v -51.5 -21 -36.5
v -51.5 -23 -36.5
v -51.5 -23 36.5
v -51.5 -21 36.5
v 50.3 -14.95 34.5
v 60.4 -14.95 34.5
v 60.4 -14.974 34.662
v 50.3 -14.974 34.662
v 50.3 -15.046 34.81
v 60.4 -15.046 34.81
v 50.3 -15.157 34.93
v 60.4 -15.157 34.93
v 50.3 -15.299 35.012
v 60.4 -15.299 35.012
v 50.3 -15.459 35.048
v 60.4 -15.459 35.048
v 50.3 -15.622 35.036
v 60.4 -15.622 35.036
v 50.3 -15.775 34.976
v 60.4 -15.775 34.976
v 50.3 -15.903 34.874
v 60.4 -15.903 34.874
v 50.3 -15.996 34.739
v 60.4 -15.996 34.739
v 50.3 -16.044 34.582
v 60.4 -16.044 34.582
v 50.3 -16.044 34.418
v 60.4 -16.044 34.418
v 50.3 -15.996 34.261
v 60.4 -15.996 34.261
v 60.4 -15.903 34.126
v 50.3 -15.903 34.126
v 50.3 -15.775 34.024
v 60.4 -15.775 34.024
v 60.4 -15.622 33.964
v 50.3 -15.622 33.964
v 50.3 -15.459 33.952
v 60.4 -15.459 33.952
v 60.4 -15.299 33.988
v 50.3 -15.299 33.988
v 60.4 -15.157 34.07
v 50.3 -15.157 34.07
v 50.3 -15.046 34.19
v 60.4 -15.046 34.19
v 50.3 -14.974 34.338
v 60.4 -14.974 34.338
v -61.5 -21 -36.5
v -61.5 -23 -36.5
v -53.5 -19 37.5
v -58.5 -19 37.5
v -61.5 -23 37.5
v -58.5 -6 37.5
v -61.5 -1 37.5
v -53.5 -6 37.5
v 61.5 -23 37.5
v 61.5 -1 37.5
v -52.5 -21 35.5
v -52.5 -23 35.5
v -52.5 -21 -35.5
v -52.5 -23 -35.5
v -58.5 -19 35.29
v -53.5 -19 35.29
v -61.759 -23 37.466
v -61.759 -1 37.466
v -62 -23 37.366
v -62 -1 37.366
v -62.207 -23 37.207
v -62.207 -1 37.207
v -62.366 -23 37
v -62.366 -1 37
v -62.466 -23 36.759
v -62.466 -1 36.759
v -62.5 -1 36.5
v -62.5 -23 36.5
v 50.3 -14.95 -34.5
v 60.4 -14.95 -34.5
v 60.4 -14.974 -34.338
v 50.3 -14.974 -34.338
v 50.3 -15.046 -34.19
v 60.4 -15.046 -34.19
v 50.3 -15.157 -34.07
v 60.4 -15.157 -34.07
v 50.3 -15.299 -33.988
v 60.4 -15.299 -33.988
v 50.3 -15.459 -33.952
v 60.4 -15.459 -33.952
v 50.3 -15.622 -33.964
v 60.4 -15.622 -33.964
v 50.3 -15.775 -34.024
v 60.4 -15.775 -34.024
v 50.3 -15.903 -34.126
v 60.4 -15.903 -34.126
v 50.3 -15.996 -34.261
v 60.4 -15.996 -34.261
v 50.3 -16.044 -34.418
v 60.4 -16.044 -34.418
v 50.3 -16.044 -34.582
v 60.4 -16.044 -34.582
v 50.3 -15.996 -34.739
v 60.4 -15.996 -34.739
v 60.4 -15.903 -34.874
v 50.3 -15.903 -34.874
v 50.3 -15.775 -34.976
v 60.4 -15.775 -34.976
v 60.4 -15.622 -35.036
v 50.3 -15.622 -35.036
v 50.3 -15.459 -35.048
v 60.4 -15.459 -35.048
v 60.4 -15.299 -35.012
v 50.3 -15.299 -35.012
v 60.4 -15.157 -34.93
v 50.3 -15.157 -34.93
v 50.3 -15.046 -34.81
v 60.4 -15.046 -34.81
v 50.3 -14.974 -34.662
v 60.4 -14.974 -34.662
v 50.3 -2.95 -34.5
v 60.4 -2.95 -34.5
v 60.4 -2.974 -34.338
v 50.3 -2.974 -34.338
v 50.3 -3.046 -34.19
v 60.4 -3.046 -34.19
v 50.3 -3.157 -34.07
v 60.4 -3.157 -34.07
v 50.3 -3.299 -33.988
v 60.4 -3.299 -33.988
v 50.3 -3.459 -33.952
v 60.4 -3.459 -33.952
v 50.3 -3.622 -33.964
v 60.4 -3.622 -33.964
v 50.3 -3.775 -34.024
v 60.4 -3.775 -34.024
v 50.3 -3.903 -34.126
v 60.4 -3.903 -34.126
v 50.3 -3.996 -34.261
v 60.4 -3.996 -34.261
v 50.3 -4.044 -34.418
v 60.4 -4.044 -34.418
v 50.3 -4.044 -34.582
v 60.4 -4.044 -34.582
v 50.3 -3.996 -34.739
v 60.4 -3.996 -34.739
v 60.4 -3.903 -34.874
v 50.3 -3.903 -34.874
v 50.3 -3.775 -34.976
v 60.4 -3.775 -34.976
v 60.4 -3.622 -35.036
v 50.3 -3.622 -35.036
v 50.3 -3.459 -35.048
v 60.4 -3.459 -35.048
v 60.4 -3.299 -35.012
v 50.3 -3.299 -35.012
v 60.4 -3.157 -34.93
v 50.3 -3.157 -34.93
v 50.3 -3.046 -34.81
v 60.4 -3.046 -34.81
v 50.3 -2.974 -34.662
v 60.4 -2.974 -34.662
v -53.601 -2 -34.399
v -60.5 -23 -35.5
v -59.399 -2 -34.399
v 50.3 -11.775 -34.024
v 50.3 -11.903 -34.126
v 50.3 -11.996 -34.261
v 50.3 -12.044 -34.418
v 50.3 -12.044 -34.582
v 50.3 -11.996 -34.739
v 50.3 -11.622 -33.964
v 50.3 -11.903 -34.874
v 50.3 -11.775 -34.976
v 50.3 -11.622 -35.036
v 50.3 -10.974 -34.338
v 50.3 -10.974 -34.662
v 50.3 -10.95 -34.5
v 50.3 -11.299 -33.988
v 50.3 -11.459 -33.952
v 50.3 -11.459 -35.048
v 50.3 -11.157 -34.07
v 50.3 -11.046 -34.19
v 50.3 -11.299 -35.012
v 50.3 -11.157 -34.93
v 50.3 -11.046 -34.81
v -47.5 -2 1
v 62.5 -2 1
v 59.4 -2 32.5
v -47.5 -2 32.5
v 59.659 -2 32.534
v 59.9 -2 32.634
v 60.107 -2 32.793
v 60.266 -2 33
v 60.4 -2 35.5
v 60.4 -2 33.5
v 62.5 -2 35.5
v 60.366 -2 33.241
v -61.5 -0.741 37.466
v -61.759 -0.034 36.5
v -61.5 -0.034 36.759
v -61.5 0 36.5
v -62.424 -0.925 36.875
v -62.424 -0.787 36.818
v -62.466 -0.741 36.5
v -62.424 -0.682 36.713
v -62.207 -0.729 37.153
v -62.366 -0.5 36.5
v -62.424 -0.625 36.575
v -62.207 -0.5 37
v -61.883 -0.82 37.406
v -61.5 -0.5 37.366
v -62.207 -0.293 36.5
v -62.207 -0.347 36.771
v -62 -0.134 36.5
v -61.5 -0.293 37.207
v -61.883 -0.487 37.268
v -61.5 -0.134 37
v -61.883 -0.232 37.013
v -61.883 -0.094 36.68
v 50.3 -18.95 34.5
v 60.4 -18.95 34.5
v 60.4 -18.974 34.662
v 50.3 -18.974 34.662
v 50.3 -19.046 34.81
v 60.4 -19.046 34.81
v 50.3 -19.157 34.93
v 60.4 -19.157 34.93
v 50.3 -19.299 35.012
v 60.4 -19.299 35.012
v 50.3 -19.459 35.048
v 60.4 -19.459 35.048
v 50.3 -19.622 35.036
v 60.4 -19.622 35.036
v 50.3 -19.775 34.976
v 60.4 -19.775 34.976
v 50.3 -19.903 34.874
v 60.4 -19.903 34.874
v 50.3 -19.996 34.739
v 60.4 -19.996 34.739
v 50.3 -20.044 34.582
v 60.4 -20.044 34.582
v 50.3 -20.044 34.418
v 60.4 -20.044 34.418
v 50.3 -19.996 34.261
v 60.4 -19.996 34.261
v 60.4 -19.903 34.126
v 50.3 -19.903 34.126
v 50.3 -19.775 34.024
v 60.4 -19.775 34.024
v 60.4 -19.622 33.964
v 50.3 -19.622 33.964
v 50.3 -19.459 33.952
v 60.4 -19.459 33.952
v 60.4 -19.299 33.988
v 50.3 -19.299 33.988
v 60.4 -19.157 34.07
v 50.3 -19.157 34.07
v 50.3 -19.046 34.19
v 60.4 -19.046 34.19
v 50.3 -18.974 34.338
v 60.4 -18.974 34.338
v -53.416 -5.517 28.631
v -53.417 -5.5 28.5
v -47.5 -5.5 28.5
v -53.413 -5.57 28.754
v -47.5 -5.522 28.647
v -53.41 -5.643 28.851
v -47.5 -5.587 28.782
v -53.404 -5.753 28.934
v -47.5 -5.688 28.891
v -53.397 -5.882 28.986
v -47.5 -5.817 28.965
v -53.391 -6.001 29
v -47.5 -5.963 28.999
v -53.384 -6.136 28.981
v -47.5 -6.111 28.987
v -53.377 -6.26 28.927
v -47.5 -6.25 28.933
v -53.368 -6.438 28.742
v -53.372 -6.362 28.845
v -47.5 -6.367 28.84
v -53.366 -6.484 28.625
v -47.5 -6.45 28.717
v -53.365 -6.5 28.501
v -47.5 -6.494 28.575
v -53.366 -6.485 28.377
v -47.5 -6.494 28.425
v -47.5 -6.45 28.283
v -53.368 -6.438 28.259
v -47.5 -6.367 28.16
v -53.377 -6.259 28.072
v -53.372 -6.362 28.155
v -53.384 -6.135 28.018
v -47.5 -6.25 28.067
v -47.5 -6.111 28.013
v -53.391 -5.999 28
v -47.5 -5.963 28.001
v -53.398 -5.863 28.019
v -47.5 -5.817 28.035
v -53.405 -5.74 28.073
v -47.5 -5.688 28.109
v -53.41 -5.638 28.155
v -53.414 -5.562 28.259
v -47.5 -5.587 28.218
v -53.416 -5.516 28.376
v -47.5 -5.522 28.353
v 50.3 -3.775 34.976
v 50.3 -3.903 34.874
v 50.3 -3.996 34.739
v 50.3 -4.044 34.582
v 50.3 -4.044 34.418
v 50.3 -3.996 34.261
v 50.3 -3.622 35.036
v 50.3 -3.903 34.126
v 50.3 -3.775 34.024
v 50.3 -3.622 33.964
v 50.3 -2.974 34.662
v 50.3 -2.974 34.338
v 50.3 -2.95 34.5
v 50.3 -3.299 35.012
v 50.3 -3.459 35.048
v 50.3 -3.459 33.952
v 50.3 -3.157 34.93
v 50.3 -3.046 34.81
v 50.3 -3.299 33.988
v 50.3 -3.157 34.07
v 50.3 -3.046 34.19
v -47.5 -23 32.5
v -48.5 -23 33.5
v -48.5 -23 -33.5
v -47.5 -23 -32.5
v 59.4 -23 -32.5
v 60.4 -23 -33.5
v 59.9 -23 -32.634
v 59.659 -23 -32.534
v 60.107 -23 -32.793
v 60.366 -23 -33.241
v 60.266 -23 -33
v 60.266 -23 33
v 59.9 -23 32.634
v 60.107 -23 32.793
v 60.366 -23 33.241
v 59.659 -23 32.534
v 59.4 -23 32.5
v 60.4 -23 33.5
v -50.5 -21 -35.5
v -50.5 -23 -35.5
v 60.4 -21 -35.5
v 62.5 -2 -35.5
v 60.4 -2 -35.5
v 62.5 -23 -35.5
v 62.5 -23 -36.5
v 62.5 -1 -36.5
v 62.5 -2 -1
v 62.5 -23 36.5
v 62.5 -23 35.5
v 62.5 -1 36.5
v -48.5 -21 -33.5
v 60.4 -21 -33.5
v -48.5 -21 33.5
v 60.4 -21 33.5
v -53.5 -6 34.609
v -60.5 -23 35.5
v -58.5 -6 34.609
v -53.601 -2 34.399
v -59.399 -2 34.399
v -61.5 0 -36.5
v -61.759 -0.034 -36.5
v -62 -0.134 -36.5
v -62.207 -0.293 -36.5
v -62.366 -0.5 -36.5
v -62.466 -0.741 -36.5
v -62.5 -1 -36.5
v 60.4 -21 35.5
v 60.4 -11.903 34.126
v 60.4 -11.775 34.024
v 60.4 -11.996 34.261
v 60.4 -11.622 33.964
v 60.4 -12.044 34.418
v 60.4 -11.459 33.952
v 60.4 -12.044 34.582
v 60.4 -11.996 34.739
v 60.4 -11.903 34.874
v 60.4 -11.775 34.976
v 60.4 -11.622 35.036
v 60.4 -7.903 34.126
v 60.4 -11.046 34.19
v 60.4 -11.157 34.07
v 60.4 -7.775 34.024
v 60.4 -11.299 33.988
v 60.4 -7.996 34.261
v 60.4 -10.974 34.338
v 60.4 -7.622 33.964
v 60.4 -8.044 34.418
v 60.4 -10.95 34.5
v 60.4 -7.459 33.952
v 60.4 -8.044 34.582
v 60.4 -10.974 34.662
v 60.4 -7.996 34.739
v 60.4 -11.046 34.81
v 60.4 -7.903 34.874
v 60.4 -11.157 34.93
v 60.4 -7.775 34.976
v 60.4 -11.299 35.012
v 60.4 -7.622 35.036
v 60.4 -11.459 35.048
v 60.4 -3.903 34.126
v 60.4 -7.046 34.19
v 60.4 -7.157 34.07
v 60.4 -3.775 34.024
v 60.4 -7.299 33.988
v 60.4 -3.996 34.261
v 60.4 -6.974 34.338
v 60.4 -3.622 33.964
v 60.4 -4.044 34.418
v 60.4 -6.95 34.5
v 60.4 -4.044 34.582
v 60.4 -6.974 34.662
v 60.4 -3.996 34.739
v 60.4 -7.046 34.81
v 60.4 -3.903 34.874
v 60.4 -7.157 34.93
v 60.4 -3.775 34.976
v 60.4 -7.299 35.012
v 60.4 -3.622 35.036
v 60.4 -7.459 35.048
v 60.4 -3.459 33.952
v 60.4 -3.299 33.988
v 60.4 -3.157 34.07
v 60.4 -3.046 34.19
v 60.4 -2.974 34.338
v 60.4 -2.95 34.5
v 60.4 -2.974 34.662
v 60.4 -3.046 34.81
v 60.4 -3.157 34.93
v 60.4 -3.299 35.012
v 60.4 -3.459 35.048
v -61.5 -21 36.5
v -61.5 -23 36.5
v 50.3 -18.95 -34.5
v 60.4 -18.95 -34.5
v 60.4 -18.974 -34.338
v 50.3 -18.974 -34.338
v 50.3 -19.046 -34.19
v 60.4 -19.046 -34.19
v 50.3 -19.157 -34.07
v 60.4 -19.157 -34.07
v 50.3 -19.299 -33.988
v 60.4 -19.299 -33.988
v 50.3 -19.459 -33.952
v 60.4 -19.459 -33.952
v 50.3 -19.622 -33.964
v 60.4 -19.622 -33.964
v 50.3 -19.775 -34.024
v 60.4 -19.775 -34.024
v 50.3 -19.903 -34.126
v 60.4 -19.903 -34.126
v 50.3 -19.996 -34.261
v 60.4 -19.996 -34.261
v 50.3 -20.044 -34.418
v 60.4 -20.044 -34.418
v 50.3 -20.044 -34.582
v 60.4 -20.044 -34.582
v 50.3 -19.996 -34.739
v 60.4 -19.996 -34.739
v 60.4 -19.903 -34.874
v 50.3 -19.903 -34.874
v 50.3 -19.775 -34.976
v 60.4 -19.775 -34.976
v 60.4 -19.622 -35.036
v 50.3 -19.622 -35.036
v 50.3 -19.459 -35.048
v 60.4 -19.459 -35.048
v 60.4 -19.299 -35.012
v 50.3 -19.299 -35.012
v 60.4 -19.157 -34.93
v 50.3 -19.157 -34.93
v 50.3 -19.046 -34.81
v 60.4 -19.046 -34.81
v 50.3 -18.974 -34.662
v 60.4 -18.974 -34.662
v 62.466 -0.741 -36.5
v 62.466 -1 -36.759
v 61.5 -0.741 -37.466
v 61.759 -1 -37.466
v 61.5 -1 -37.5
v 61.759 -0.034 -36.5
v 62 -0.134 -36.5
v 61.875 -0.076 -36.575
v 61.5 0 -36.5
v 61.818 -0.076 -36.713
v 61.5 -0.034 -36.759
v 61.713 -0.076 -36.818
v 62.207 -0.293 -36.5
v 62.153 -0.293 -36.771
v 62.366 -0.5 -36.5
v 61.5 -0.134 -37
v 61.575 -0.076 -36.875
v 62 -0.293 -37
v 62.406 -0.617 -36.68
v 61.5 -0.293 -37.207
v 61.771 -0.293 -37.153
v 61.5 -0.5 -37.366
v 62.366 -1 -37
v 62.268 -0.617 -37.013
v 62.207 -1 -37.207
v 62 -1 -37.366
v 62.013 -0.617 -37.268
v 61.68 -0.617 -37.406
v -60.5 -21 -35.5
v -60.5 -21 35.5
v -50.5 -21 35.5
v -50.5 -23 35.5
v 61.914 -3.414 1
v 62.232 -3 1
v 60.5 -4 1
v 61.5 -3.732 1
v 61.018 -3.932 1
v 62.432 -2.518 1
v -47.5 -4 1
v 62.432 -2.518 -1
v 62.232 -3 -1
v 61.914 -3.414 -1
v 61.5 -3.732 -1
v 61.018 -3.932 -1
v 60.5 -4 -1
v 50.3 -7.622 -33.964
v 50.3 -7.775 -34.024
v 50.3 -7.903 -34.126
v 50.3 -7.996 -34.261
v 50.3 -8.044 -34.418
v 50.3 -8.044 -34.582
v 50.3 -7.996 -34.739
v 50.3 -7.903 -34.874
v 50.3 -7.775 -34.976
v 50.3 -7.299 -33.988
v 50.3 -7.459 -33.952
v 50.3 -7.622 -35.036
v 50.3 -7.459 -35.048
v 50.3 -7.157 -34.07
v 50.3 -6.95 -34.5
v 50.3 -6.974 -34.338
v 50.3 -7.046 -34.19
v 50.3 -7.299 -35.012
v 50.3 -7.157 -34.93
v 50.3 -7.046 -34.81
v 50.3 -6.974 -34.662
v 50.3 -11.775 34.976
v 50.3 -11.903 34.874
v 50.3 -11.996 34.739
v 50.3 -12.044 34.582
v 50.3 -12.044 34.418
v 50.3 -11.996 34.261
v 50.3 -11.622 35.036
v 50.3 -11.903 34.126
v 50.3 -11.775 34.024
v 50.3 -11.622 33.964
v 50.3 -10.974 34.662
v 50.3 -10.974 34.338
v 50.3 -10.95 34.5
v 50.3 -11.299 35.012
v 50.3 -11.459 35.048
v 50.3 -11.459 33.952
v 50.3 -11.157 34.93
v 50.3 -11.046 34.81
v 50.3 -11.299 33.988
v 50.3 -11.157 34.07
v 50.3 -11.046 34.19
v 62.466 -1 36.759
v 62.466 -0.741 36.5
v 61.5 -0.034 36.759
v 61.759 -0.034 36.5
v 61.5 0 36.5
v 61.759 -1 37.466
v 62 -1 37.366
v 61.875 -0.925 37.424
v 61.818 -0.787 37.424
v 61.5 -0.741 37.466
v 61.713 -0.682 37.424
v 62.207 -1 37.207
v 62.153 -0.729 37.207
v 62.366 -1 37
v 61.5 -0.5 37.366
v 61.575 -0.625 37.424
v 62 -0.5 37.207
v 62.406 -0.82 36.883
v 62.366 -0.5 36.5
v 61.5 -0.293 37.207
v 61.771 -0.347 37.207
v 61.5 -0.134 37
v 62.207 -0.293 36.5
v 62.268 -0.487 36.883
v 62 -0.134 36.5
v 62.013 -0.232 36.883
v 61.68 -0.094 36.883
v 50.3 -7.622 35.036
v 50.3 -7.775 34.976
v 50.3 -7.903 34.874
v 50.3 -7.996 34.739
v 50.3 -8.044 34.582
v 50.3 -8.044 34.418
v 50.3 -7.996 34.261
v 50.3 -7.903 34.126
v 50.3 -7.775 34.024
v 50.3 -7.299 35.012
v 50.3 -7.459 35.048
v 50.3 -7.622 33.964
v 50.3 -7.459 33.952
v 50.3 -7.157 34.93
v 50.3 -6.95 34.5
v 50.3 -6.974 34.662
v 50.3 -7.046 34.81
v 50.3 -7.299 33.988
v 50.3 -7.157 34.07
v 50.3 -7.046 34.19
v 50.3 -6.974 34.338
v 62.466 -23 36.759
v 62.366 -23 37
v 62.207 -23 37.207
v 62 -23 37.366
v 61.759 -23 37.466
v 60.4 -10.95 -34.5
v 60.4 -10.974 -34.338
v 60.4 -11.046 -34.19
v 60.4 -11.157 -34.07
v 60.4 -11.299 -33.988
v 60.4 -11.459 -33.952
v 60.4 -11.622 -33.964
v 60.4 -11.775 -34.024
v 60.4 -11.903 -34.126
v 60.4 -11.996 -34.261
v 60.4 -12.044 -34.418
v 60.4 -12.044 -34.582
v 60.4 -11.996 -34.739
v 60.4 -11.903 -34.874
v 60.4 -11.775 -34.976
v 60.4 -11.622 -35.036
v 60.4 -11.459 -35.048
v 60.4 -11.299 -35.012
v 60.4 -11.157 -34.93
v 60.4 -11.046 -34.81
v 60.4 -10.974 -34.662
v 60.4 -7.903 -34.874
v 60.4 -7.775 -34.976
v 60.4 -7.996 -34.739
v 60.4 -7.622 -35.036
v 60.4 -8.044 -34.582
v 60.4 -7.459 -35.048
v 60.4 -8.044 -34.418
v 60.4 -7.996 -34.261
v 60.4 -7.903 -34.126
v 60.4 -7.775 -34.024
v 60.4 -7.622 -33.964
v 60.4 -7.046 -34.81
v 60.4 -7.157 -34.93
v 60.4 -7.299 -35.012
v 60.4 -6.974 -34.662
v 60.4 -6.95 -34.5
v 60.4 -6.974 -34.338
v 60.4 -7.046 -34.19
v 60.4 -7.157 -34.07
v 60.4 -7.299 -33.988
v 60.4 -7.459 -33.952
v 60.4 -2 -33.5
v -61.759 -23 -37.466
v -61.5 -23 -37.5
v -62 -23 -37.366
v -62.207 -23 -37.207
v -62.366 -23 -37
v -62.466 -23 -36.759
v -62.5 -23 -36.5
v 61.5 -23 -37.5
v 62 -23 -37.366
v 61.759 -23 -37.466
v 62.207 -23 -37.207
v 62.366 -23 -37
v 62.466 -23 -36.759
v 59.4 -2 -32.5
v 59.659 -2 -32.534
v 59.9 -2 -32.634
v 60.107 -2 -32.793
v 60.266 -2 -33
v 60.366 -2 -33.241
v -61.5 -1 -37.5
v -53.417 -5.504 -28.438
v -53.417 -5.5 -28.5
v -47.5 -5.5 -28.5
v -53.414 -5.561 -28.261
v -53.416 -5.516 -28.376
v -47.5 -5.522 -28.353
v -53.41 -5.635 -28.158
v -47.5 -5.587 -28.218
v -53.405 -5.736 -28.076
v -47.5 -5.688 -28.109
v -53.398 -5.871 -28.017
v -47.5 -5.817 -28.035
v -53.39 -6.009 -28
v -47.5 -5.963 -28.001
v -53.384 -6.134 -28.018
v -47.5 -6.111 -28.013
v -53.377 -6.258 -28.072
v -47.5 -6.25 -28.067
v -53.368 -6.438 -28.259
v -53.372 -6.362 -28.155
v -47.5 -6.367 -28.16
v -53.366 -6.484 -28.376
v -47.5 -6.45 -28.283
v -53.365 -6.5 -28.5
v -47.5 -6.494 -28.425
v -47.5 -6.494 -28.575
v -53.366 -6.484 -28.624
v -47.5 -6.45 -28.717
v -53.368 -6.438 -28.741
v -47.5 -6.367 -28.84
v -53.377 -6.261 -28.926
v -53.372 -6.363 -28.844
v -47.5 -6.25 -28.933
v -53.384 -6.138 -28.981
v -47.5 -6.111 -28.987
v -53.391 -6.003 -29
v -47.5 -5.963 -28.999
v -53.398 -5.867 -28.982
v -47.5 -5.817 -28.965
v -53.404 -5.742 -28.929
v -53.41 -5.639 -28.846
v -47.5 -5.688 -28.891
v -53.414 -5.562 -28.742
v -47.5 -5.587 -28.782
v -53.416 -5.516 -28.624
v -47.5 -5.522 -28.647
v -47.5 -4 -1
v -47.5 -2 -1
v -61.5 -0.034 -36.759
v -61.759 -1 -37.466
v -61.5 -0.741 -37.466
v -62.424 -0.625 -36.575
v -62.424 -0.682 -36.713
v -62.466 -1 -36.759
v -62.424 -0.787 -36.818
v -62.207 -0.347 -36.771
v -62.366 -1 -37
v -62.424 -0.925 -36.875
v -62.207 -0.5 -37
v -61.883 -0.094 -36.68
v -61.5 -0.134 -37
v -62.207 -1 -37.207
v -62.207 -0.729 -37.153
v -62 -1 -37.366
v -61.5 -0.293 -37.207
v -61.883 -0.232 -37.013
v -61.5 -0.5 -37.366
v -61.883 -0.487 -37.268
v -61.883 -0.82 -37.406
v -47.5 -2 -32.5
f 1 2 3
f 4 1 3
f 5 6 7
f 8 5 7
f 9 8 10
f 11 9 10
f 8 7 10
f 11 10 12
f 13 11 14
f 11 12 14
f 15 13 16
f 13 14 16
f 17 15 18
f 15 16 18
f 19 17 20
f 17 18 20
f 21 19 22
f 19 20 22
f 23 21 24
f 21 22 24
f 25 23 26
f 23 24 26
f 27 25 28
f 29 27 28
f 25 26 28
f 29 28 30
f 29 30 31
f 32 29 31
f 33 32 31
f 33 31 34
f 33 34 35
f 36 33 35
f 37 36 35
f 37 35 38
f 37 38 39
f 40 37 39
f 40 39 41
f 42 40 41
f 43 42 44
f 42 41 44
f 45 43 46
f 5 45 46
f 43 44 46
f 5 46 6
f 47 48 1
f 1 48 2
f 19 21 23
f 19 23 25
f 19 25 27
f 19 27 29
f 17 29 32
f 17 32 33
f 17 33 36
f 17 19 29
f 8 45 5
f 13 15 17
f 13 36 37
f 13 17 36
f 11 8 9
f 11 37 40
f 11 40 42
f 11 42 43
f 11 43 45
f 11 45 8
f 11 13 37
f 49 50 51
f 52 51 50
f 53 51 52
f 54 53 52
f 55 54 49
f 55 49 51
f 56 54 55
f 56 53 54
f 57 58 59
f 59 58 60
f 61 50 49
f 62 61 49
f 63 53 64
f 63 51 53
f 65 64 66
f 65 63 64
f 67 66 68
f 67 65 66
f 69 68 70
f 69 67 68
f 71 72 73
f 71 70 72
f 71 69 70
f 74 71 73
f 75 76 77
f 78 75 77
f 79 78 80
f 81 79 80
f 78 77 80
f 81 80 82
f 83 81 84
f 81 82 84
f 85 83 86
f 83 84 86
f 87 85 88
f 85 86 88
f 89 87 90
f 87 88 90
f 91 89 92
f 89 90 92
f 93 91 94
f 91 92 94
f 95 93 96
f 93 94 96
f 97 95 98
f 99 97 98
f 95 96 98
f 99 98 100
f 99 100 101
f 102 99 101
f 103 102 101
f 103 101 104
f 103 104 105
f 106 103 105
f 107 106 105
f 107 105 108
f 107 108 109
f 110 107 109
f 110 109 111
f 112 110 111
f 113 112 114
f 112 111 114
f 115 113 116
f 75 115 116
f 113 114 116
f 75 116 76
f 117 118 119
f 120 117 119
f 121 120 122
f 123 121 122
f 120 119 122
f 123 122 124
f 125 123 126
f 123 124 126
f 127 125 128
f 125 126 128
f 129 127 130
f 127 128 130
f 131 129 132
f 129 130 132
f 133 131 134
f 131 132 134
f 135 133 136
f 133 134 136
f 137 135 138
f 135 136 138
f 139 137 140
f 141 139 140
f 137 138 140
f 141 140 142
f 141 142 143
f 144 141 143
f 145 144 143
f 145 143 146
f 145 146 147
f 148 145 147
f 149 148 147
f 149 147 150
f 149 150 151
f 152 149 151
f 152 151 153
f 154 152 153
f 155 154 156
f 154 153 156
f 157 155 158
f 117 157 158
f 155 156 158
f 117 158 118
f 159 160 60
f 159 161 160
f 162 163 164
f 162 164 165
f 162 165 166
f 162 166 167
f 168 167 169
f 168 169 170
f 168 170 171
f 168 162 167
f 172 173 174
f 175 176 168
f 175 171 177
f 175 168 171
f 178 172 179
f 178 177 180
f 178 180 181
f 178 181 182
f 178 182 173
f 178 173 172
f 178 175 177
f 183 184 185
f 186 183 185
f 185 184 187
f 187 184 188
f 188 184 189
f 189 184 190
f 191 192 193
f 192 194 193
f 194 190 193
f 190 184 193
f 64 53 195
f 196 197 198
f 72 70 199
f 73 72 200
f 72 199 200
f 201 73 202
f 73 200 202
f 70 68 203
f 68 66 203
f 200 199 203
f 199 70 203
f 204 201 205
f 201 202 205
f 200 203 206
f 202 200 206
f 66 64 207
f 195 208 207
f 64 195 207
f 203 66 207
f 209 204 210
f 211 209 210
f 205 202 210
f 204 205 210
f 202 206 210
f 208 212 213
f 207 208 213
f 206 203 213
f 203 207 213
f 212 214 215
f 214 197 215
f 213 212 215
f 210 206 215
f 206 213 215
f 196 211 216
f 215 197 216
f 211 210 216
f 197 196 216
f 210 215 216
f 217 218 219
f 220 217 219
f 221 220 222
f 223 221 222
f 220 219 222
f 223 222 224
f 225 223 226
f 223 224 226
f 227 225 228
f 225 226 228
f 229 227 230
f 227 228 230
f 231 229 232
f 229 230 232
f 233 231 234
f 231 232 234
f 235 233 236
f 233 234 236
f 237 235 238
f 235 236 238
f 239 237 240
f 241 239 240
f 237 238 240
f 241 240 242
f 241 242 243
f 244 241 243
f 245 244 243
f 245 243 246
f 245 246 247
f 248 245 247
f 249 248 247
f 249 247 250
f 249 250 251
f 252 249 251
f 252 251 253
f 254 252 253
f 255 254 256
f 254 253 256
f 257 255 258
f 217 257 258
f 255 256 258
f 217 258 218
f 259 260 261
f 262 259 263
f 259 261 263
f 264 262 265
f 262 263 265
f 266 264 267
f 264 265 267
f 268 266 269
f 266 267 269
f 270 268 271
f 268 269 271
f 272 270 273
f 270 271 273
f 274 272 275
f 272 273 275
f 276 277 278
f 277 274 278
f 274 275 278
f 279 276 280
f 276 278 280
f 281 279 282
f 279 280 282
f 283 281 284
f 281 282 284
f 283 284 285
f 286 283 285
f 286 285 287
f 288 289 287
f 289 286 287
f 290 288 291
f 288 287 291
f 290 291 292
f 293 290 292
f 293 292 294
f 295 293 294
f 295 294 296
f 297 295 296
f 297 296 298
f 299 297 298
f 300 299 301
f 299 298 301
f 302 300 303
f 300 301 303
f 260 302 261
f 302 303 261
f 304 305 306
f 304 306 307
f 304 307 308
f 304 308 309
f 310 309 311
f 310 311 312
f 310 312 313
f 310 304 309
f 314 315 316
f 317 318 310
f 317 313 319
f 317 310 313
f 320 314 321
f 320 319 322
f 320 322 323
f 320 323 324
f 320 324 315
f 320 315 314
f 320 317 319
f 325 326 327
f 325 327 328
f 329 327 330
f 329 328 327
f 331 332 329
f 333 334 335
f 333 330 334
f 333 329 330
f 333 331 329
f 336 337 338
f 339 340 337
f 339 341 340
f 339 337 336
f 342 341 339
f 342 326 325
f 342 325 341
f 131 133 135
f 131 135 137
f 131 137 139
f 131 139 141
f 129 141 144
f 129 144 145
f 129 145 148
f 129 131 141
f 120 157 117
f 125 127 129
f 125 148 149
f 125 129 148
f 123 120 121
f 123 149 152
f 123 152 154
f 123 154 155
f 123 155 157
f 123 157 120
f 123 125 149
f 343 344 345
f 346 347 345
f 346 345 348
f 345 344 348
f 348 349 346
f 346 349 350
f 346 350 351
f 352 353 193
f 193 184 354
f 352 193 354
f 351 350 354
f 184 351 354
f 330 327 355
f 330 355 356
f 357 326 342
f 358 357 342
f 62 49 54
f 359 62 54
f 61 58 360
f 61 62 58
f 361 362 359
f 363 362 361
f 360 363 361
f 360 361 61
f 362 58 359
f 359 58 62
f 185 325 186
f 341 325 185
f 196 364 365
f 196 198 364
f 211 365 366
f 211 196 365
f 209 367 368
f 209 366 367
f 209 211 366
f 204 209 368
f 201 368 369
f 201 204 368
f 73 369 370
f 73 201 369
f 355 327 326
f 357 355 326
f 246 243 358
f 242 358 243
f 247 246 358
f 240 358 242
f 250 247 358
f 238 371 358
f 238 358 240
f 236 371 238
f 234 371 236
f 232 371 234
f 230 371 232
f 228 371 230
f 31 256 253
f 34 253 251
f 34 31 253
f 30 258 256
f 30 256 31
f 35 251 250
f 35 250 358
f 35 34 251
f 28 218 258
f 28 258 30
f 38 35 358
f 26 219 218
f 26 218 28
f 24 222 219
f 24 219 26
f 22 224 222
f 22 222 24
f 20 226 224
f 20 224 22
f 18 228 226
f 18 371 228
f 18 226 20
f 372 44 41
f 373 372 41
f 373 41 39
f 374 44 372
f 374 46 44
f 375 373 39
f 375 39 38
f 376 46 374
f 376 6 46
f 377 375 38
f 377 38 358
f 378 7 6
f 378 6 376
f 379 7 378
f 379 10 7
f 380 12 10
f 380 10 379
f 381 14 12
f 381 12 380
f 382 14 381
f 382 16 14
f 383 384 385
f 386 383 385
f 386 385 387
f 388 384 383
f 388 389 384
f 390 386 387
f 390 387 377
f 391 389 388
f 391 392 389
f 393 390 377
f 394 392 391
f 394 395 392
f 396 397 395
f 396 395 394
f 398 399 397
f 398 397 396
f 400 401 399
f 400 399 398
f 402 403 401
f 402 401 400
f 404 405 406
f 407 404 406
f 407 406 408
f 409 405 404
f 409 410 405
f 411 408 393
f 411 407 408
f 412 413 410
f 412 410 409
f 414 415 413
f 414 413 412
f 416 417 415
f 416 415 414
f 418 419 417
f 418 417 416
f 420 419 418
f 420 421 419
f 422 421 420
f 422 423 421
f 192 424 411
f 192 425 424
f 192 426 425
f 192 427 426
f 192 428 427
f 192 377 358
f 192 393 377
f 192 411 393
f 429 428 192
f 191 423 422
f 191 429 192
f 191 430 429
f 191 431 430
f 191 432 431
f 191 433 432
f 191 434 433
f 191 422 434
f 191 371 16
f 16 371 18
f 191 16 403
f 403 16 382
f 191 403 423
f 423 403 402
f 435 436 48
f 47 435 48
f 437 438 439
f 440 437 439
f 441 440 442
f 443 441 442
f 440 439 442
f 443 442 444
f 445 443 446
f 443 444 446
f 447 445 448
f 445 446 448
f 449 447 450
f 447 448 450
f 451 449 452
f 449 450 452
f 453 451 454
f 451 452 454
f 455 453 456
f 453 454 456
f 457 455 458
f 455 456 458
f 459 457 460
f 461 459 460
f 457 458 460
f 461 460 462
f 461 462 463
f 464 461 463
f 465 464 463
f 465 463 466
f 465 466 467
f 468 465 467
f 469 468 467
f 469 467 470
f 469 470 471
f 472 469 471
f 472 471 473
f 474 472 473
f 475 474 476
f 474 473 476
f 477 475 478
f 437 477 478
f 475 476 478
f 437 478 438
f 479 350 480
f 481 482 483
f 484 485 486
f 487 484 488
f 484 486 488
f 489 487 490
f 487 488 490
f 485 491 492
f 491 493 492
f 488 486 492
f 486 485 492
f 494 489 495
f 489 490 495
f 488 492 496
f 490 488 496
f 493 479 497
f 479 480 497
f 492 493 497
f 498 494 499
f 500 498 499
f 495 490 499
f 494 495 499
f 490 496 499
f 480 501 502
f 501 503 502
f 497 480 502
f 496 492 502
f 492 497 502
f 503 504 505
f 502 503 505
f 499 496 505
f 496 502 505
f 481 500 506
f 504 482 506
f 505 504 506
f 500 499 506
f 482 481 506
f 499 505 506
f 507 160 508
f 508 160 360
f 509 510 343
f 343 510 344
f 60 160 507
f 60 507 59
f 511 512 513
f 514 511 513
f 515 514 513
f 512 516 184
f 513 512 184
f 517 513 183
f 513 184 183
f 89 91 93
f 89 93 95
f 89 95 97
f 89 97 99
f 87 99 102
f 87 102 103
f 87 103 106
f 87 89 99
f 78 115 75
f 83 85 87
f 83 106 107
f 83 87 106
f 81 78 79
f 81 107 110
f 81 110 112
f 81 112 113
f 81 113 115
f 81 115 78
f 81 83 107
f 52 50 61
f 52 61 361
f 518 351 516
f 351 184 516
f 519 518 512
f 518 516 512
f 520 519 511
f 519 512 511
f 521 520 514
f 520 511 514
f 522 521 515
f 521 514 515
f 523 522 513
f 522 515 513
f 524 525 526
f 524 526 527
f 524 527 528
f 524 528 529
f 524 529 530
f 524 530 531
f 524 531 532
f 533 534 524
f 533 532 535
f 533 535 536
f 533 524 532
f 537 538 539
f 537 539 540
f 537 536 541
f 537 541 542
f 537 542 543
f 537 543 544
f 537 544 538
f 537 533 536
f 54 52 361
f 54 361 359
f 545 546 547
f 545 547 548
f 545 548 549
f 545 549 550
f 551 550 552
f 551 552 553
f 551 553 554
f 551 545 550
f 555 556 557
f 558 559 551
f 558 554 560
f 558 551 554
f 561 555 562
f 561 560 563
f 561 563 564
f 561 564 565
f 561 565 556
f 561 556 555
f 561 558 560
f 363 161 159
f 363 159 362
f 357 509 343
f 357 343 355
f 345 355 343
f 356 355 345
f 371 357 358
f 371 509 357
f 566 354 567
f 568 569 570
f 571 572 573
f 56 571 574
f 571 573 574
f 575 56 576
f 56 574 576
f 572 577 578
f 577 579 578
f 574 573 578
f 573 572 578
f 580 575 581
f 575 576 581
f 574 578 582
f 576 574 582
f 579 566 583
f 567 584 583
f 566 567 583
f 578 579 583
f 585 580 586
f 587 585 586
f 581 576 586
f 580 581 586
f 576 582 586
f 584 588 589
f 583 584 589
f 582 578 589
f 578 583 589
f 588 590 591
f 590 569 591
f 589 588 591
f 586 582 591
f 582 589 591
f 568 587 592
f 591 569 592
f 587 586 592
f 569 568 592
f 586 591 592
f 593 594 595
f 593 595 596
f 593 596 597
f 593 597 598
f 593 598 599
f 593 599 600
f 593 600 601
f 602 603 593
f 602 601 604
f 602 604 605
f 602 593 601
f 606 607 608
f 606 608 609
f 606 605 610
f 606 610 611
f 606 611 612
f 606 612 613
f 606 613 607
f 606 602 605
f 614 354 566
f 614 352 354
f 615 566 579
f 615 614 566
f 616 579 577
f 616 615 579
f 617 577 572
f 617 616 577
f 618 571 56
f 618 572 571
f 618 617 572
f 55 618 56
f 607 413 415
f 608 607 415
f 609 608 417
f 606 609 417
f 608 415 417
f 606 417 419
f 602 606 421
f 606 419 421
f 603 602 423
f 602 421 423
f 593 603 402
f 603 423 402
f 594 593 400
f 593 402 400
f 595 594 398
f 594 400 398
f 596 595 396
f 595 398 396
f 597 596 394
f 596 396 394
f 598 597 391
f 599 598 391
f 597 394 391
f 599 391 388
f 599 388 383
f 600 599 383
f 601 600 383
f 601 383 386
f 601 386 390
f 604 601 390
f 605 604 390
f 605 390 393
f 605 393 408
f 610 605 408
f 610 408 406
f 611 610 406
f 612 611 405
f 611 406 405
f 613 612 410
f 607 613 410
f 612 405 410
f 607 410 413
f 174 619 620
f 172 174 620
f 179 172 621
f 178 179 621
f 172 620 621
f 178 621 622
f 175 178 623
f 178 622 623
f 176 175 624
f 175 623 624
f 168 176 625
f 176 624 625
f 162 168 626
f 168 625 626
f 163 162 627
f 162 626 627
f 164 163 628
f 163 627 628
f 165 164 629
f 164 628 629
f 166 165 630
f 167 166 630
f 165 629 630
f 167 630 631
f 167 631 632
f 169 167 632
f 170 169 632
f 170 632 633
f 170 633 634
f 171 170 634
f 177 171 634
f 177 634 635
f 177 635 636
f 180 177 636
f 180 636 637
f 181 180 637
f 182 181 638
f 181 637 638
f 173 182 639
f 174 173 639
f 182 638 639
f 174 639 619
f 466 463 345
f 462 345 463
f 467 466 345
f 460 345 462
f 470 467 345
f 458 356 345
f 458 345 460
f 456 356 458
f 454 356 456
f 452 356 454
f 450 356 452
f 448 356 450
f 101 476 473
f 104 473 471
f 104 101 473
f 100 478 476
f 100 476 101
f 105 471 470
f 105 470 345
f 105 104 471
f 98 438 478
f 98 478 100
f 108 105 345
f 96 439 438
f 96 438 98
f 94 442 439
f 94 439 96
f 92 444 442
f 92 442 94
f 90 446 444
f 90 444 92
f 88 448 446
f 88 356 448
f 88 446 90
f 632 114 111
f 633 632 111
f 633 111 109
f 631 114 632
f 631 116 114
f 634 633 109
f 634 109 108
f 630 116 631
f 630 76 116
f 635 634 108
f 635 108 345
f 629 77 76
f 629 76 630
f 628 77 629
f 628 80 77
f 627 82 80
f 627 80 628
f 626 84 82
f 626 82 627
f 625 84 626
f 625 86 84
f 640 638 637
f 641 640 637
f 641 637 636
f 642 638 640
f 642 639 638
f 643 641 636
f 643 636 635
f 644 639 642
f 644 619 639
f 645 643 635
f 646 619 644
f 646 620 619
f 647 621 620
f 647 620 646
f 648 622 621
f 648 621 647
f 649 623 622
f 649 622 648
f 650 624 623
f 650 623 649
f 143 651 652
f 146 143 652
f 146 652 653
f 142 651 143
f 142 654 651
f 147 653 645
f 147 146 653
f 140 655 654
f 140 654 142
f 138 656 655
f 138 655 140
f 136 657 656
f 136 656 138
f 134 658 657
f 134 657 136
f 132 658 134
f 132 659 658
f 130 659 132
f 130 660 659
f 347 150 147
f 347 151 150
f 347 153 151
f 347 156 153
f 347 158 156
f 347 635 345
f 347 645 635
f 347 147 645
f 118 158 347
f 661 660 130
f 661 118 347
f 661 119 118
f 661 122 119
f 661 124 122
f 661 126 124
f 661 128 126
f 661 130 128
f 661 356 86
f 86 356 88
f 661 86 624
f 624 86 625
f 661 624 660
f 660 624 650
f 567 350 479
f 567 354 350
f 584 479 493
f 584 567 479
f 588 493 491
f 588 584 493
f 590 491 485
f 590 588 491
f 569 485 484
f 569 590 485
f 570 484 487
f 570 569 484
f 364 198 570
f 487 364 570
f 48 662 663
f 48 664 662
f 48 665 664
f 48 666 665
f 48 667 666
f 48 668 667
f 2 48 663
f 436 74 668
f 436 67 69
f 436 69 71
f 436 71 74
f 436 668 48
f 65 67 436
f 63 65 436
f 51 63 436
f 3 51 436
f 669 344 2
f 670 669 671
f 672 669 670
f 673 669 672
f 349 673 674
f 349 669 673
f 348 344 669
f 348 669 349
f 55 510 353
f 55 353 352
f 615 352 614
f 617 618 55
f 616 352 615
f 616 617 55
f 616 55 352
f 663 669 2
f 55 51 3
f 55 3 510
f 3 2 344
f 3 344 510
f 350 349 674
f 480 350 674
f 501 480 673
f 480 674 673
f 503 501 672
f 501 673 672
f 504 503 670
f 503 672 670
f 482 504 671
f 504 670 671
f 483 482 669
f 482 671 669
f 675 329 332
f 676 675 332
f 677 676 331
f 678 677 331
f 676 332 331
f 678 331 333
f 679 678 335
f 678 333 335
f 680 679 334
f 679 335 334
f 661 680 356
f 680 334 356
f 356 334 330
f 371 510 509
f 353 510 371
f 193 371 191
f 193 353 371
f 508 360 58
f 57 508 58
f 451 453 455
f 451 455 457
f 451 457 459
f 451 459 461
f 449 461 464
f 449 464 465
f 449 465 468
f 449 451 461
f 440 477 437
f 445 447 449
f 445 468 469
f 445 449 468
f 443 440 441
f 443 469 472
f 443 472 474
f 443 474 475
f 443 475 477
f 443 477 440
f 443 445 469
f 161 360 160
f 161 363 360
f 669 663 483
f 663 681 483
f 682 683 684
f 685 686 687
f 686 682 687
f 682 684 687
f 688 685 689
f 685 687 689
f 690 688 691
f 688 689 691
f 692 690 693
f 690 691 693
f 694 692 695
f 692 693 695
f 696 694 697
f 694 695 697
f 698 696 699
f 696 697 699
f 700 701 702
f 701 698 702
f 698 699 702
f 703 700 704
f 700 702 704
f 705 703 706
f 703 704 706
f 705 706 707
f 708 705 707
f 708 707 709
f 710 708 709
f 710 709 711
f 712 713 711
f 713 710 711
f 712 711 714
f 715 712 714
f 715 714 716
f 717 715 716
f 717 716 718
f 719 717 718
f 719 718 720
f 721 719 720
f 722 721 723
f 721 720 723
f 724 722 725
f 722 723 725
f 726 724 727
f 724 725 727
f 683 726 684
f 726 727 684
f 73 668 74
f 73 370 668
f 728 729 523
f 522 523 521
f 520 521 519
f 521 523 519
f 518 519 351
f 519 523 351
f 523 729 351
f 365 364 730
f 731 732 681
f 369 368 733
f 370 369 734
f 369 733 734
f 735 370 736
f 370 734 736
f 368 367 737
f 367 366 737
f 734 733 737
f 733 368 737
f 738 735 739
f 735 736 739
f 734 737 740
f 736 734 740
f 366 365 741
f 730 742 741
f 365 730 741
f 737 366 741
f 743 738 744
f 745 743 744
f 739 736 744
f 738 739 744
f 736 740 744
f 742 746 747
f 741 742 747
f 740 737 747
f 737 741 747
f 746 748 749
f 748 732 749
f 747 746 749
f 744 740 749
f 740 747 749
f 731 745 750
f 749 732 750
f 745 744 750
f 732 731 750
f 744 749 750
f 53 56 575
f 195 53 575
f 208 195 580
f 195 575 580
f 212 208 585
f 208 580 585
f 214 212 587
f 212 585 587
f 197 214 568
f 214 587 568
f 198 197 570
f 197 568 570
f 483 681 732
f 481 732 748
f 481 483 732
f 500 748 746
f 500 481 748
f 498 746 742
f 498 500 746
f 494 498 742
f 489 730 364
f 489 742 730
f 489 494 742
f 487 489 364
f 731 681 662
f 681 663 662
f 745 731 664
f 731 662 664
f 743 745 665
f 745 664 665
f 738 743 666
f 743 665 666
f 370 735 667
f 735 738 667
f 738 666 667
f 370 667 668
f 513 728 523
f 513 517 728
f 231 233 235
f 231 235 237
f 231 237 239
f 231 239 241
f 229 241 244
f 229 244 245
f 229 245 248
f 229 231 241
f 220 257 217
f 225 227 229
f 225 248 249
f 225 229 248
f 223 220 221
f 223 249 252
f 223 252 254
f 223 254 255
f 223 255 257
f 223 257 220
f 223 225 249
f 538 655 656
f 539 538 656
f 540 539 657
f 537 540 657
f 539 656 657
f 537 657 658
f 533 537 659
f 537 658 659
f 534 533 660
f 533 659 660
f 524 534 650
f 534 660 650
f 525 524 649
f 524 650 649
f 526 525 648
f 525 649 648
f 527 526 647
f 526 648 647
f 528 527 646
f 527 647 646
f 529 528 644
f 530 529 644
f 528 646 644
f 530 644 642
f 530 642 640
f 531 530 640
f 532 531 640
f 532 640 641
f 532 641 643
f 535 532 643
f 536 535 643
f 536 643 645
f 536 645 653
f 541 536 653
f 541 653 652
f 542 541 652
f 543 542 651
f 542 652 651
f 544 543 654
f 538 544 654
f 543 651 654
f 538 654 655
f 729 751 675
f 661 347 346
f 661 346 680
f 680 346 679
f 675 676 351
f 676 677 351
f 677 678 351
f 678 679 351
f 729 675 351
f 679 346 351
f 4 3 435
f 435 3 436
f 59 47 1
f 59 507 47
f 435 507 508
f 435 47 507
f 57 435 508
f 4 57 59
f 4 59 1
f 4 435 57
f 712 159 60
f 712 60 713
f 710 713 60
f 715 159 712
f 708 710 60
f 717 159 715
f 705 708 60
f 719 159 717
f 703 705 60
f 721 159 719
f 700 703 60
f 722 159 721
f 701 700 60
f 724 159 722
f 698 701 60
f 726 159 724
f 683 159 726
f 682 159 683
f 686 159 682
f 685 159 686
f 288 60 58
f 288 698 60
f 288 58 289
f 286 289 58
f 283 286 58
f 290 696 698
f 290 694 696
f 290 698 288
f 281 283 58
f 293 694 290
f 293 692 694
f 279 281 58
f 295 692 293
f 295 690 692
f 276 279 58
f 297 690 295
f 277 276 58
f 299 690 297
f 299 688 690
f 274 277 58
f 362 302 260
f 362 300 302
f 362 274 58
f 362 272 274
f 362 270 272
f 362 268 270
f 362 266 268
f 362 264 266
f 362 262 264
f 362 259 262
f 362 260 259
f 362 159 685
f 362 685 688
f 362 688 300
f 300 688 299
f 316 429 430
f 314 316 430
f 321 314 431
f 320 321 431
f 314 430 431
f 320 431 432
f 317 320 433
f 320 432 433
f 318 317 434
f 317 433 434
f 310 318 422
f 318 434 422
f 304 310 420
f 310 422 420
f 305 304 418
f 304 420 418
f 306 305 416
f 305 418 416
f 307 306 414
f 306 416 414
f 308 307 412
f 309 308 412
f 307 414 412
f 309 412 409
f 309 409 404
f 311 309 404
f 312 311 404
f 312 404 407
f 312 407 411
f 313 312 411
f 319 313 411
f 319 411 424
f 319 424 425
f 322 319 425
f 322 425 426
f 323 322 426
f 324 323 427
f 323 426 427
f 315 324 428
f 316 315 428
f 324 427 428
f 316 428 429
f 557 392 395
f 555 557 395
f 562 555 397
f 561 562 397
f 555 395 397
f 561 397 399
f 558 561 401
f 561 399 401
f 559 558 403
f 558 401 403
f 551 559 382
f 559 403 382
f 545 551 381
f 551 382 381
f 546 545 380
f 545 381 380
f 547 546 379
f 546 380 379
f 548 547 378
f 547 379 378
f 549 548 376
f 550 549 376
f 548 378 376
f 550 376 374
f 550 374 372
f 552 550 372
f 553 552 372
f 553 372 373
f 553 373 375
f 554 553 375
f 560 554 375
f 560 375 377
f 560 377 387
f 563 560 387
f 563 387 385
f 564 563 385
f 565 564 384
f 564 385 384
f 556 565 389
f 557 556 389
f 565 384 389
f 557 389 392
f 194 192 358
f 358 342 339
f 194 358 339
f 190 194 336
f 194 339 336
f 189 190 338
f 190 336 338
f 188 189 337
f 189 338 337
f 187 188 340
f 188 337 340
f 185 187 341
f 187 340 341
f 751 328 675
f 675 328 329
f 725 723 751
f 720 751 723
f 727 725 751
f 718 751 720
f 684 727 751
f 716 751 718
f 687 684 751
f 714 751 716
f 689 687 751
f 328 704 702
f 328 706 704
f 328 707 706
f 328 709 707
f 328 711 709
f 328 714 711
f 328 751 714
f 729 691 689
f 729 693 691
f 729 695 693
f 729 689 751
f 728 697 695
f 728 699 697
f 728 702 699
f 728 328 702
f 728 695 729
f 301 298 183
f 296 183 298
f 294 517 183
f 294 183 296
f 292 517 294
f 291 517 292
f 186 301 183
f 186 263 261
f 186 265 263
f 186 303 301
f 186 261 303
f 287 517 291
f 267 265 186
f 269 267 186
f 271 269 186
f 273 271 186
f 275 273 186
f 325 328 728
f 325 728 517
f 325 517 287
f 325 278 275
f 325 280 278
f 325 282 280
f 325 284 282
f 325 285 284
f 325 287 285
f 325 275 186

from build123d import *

# Parameters (mm, degrees)
F0_W      = 125
F0_H      = 75
F1_DEPTH  = 23
F2_W      = 108
F2_H      = 65
F3_DEPTH  = 21
F4_W      = 8
F4_H      = 71
F5_DEPTH  = 21
F5_TAPER  = 3
F6_W      = 21
F6_H      = 71
F7_DEPTH  = 2.1
F8_W      = 108.9
F8_H      = 2
F9_DEPTH  = 2
F10_W     = 95
F10_H     = 2
F10_W_2   = 15
F11_DEPTH = 2
F12_R     = 2
F13_R     = 1
F14_R     = 1
F15_W     = 8
F15_H     = 1
F16_DEPTH = 2
F17_R     = 0.55
F18_DEPTH = 10.1
F19_R     = 0.55
F20_DEPTH = 10.1
F21_R     = 0.5
F22_DEPTH = 8
F23_W     = 5
F23_H     = 13
F24_DEPTH = 3


with BuildPart() as f1:
    # F0 (on Front) → F1 (new body)
    with BuildSketch(Plane.XZ):
        Rectangle(F0_W, F0_H)
    extrude(amount=F1_DEPTH)

    # F2 (on face) → F3 (cut)
    with BuildSketch(Plane.XZ.offset(23)):
        with Locations((6.5, 0)):
            Rectangle(F2_W, F2_H)
    extrude(amount=-F3_DEPTH, mode=Mode.SUBTRACT)

    # F4 (on face) → F5 (cut)
    with BuildSketch(Plane.XZ.offset(23)):
        with Locations((-56.5, 0)):
            Rectangle(F4_W, F4_H)
    extrude(amount=-F5_DEPTH, taper=F5_TAPER, mode=Mode.SUBTRACT)

    # F6 (on face) → F7 (cut)
    with BuildSketch(Plane.YZ.offset(62.5)):
        with Locations((-12.5, 0)):
            Rectangle(F6_W, F6_H)
    extrude(amount=-F7_DEPTH, mode=Mode.SUBTRACT)

    # F8 (on face) → F9 (cut)
    with BuildSketch(Plane.XZ.offset(23)):
        Polygon((-48.5, 33.5), (-50.5, 33.5), (-50.5, -35.5), (-48.5, -35.5), (-48.5, -33.5), align=None)
        Polygon((60.4, 33.5), (60.4, 35.5), (-50.5, 35.5), (-50.5, 33.5), (-48.5, 33.5), align=None)
        with Locations((5.95, -34.5)):
            Rectangle(F8_W, F8_H)
    extrude(amount=-F9_DEPTH, mode=Mode.SUBTRACT)

    # F10 (on face) → F11 (join)
    with BuildSketch(Plane.XZ.offset(2)):
        Rectangle(F10_W, F10_H)
        with Locations((55, 0)):
            Rectangle(F10_W_2, F10_H)
    extrude(amount=F11_DEPTH)

    # F12
    f12_edges = [f1.edges().sort_by_distance(p)[0] for p in [
        (62.5, -4, 0),
    ]]
    fillet(f12_edges, radius=F12_R)

    # F13
    f13_edges = [f1.edges().sort_by_distance(p)[0] for p in [
        (60.4, -12.5, 32.5),
        (60.4, -12.5, -32.5),
    ]]
    fillet(f13_edges, radius=F13_R)

    # F14
    f14_edges = [f1.edges().sort_by_distance(p)[0] for p in [
        (62.5, -11.5, -37.5),
        (62.5, 0, 0),
        (0, 0, -37.5),
        (62.5, -11.5, 37.5),
        (0, 0, 37.5),
        (-62.5, -11.5, 37.5),
        (-62.5, 0, 0),
        (-62.5, -11.5, -37.5),
    ]]
    fillet(f14_edges, radius=F14_R)

    # F15 (on face) → F16 (cut)
    with BuildSketch(Plane.XZ.offset(23)):
        with Locations((-56.5, 36)):
            Rectangle(F15_W, F15_H)
        Polygon((-60.5, -35.5), (-60.5, 35.5), (-60.5, 36.5), (-61.5, 36.5), (-61.5, -36.5), (-60.5, -36.5), align=None)
        Polygon((-52.5, 36.5), (-52.5, 35.5), (-52.5, -35.5), (-52.5, -36.5), (-51.5, -36.5), (-51.5, 36.5), align=None)
        with Locations((-56.5, -36)):
            Rectangle(F15_W, F15_H)
    extrude(amount=-F16_DEPTH, mode=Mode.SUBTRACT)

    # F17 (on face) → F18 (cut)
    with BuildSketch(Plane.YZ.offset(60.4)):
        with Locations((-19.5, -34.5)):
            Circle(F17_R)
        with Locations((-15.5, -34.5)):
            Circle(F17_R)
        with Locations((-11.5, -34.5)):
            Circle(F17_R)
        with Locations((-3.5, -34.5)):
            Circle(F17_R)
        with Locations((-7.5, -34.5)):
            Circle(F17_R)
    extrude(amount=-F18_DEPTH, mode=Mode.SUBTRACT)

    # F19 (on face) → F20 (cut)
    with BuildSketch(Plane.YZ.offset(60.4)):
        with Locations((-19.5, 34.5)):
            Circle(F19_R)
        with Locations((-15.5, 34.5)):
            Circle(F19_R)
        with Locations((-11.5, 34.5)):
            Circle(F19_R)
        with Locations((-7.5, 34.5)):
            Circle(F19_R)
        with Locations((-3.5, 34.5)):
            Circle(F19_R)
    extrude(amount=-F20_DEPTH, mode=Mode.SUBTRACT)

    # F21 (on face) → F22 (cut)
    with BuildSketch(Plane.YZ.offset(-47.5)):
        with Locations((-6, -28.5)):
            Circle(F21_R)
        with Locations((-6, 28.5)):
            Circle(F21_R)
    extrude(amount=-F22_DEPTH, mode=Mode.SUBTRACT)

    # F23 (on face) → F24 (cut)
    with BuildSketch(Plane.XY.offset(37.5)):
        with Locations((-56, -12.5)):
            Rectangle(F23_W, F23_H)
    extrude(amount=-F24_DEPTH, mode=Mode.SUBTRACT)


solid = f1.part
